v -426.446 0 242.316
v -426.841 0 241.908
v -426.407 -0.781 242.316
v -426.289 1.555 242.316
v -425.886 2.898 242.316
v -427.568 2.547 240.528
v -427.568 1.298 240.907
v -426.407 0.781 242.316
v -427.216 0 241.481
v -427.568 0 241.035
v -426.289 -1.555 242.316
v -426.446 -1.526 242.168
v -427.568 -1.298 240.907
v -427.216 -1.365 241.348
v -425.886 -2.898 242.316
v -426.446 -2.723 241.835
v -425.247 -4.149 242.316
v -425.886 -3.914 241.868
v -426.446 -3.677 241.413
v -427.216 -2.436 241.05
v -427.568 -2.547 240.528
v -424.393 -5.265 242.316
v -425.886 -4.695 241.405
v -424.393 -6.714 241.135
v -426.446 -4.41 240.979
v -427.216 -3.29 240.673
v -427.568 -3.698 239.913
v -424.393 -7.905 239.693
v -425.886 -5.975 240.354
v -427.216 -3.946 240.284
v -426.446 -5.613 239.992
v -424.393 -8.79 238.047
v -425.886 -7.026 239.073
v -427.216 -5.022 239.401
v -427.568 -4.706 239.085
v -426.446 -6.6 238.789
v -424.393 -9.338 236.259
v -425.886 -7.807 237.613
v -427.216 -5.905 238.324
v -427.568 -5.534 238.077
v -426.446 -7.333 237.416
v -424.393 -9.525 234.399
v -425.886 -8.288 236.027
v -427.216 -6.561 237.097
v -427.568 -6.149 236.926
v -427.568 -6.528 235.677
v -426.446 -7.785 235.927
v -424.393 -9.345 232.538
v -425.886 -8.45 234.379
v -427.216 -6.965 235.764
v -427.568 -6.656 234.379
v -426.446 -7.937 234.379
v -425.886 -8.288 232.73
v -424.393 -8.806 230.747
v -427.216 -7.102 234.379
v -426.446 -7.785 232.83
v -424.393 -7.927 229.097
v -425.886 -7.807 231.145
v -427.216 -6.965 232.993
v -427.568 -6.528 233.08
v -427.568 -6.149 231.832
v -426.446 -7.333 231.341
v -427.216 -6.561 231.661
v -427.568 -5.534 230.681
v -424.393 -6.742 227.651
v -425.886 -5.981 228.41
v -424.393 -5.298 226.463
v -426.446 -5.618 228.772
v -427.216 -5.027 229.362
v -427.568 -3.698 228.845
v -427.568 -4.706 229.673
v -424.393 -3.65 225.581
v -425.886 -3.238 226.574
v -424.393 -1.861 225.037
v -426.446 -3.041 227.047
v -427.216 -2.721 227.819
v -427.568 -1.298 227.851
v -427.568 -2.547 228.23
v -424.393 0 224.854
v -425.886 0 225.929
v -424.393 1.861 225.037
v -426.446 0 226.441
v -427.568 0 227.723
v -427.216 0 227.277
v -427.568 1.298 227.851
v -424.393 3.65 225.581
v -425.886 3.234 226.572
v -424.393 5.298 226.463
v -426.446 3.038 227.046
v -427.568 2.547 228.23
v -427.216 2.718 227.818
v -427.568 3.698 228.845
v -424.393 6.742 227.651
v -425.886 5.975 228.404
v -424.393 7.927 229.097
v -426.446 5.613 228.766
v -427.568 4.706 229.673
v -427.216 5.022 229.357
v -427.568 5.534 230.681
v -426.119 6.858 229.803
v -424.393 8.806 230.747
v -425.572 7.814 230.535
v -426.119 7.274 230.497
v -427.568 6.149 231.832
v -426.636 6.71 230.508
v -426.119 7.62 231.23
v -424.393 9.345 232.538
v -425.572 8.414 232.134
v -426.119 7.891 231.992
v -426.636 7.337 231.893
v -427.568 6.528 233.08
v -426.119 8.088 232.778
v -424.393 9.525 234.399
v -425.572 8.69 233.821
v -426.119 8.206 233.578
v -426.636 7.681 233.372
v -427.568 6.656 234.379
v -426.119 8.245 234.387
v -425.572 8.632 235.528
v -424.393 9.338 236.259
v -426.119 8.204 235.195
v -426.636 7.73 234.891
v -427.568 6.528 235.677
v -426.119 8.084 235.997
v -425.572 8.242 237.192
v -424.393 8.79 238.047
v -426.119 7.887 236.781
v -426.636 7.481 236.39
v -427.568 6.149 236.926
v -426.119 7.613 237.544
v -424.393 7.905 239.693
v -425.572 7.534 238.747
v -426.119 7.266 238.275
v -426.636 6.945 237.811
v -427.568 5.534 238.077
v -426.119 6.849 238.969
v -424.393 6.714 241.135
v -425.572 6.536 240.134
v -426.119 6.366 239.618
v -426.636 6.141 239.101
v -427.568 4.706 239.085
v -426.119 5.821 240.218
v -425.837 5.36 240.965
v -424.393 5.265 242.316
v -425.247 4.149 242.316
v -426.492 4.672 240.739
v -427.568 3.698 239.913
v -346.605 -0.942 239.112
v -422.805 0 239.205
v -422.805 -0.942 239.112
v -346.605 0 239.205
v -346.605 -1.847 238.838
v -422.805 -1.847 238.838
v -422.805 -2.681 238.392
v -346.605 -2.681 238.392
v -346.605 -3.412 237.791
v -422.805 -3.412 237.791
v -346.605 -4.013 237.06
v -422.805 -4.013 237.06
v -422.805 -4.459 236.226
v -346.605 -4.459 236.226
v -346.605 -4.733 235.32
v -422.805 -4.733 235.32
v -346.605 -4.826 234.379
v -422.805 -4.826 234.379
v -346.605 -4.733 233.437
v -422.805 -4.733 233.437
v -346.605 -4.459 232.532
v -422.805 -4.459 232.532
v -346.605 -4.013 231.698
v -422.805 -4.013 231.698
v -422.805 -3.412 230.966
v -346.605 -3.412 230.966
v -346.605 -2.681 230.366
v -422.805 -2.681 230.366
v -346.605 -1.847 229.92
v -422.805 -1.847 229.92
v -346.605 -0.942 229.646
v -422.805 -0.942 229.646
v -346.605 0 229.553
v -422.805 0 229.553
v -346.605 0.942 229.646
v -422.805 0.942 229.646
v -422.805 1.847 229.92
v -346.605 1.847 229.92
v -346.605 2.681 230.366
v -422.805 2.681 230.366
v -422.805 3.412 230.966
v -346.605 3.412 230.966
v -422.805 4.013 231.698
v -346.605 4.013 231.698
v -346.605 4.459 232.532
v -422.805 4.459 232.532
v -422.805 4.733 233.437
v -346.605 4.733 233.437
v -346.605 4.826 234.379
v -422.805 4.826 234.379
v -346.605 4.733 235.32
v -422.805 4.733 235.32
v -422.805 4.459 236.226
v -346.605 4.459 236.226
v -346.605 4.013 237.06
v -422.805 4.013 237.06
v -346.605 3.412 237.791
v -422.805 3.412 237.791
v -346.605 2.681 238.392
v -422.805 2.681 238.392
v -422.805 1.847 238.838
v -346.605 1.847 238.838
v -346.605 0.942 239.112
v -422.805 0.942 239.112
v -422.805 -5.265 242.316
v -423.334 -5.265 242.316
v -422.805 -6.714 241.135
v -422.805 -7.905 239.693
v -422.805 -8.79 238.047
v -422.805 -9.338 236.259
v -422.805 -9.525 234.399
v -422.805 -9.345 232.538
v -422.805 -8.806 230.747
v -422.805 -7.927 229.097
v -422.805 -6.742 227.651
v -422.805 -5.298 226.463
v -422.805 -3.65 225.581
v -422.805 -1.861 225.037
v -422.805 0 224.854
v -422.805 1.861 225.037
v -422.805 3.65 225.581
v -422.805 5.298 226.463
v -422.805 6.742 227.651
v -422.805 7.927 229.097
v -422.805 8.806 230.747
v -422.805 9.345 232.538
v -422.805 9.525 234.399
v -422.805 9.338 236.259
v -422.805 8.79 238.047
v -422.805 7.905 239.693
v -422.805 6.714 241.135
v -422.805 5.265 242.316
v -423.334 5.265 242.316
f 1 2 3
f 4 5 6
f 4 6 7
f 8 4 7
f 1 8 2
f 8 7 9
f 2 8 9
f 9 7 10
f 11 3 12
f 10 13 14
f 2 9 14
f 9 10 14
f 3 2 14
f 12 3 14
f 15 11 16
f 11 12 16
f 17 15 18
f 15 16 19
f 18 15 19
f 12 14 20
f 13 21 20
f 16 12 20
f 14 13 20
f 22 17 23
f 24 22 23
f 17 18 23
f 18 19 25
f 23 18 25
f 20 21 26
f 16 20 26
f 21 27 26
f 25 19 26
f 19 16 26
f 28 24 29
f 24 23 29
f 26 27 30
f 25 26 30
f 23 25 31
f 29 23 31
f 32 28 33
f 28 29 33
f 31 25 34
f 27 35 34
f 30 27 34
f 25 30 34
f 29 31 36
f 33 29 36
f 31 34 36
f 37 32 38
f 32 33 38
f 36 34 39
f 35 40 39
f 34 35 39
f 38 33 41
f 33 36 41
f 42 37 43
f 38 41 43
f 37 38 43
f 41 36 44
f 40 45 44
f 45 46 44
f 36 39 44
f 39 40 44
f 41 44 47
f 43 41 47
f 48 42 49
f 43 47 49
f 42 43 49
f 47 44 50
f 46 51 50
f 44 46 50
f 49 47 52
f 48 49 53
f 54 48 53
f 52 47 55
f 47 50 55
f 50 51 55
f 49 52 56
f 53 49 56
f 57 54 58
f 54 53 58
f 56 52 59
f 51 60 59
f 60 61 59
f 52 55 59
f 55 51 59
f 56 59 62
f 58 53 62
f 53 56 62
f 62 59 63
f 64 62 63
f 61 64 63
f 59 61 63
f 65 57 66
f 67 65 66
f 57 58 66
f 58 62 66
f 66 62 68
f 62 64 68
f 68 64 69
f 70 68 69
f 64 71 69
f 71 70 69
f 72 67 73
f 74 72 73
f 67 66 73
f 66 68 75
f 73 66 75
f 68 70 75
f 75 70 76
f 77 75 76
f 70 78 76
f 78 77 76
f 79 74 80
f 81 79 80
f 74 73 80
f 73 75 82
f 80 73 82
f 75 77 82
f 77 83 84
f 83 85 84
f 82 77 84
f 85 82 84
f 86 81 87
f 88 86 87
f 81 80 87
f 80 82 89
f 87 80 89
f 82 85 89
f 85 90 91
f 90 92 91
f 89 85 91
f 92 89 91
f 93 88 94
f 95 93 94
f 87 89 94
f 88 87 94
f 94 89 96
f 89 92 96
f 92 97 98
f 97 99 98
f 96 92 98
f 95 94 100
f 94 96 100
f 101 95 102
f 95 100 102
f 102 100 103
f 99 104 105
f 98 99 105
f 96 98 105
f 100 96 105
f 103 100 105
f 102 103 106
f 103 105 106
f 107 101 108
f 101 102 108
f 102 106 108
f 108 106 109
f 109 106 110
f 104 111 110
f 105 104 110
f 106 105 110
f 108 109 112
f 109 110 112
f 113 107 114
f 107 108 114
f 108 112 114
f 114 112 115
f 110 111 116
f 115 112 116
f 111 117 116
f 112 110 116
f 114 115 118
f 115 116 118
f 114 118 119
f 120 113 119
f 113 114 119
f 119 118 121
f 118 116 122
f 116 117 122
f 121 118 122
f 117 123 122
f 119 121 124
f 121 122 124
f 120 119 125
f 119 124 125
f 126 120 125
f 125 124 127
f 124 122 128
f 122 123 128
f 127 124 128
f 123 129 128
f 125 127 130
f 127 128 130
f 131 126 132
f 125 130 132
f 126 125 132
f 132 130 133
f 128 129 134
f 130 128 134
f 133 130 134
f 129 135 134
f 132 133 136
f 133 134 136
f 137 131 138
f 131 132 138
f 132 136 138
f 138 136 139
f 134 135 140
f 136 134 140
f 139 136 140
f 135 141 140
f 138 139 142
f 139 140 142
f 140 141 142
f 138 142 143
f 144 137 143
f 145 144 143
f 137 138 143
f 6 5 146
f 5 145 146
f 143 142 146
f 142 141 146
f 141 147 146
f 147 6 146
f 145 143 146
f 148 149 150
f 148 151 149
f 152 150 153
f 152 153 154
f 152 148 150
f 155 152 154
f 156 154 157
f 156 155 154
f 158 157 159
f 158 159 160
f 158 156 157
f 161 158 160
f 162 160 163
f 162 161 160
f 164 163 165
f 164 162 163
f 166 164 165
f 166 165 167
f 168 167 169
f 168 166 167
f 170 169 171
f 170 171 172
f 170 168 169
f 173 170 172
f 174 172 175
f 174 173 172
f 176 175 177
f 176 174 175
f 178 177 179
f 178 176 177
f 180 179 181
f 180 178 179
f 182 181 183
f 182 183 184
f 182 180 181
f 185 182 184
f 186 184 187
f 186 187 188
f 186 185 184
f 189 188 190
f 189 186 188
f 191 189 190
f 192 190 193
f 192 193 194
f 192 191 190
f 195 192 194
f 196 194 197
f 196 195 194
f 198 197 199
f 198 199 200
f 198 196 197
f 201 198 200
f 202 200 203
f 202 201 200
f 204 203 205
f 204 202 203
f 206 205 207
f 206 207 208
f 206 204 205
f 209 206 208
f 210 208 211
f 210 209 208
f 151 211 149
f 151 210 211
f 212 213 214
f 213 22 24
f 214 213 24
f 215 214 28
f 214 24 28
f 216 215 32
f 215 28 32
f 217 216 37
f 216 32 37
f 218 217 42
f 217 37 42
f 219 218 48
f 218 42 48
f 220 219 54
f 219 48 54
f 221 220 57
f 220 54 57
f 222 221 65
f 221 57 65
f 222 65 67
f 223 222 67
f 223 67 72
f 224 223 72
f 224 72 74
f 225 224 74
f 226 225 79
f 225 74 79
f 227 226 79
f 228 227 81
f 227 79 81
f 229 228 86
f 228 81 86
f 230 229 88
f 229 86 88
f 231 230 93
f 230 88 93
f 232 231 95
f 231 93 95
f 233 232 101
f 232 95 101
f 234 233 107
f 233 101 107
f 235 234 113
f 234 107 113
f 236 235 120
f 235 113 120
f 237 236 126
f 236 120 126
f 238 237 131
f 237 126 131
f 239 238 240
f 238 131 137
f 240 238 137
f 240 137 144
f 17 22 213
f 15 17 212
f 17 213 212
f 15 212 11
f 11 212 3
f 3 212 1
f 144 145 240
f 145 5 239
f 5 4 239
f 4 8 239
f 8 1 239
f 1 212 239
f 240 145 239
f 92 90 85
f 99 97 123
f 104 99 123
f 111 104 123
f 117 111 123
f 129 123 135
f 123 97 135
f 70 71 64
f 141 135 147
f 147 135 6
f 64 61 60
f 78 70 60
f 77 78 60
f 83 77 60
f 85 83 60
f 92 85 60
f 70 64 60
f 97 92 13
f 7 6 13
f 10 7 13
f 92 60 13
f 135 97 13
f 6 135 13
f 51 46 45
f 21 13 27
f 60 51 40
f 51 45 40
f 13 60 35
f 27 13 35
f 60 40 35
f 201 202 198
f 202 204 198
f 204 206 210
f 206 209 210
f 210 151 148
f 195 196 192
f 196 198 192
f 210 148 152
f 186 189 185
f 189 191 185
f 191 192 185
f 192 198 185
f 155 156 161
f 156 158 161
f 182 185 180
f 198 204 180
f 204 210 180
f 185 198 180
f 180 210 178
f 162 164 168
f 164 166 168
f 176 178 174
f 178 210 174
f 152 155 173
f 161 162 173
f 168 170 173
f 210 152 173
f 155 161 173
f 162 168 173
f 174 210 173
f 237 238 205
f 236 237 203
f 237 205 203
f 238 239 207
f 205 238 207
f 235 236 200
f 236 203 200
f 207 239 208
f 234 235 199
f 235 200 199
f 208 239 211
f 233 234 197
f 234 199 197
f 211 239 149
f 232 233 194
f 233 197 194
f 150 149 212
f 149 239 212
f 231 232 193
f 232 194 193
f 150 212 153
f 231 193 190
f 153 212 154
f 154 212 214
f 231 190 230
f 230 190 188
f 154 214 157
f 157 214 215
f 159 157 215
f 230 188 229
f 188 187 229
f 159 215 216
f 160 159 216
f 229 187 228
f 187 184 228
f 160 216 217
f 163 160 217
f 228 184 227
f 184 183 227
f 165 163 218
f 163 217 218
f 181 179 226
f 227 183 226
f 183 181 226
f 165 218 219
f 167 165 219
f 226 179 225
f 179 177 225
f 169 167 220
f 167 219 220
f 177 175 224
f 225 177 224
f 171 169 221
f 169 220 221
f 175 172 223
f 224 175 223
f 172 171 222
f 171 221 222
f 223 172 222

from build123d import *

# Parameters (mm, degrees)
F0_W     = 76.2
F0_H     = 4.826
F2_W     = 10.530284
F2_H     = 4.986605
F3_DEPTH = 25.4


with BuildPart() as f1:
    # F0 (on Front) → F1 (revolve)
    with BuildSketch(Plane.XZ):
        Polygon((-422.80503, 234.378874), (-422.80503, 239.204874), (-422.80503, 243.903874), (-424.39253, 243.903874), (-424.39253, 234.378874), align=None)
        with Locations((-384.70503, 236.791874)):
            Rectangle(F0_W, F0_H)
        with BuildLine():
            Line((-424.39253, 234.378874), (-424.39253, 243.903874))
            ThreePointArc((-424.39253, 243.903874), (-426.119453, 242.623521), (-427.56753, 241.034608))
            Line((-427.56753, 241.034608), (-427.56753, 234.378874))
            Line((-427.56753, 234.378874), (-424.39253, 234.378874))
        make_face()
    revolve(axis=Axis((-387.08628, 0, 234.378874), (1, 0, 0)))

    # F2 (on face) → F3 (cut)
    with BuildSketch(Plane.YZ.offset(-422.80503)):
        with Locations((0, 244.809676)):
            Rectangle(F2_W, F2_H)
    extrude(amount=-F3_DEPTH, mode=Mode.SUBTRACT)


solid = f1.part
